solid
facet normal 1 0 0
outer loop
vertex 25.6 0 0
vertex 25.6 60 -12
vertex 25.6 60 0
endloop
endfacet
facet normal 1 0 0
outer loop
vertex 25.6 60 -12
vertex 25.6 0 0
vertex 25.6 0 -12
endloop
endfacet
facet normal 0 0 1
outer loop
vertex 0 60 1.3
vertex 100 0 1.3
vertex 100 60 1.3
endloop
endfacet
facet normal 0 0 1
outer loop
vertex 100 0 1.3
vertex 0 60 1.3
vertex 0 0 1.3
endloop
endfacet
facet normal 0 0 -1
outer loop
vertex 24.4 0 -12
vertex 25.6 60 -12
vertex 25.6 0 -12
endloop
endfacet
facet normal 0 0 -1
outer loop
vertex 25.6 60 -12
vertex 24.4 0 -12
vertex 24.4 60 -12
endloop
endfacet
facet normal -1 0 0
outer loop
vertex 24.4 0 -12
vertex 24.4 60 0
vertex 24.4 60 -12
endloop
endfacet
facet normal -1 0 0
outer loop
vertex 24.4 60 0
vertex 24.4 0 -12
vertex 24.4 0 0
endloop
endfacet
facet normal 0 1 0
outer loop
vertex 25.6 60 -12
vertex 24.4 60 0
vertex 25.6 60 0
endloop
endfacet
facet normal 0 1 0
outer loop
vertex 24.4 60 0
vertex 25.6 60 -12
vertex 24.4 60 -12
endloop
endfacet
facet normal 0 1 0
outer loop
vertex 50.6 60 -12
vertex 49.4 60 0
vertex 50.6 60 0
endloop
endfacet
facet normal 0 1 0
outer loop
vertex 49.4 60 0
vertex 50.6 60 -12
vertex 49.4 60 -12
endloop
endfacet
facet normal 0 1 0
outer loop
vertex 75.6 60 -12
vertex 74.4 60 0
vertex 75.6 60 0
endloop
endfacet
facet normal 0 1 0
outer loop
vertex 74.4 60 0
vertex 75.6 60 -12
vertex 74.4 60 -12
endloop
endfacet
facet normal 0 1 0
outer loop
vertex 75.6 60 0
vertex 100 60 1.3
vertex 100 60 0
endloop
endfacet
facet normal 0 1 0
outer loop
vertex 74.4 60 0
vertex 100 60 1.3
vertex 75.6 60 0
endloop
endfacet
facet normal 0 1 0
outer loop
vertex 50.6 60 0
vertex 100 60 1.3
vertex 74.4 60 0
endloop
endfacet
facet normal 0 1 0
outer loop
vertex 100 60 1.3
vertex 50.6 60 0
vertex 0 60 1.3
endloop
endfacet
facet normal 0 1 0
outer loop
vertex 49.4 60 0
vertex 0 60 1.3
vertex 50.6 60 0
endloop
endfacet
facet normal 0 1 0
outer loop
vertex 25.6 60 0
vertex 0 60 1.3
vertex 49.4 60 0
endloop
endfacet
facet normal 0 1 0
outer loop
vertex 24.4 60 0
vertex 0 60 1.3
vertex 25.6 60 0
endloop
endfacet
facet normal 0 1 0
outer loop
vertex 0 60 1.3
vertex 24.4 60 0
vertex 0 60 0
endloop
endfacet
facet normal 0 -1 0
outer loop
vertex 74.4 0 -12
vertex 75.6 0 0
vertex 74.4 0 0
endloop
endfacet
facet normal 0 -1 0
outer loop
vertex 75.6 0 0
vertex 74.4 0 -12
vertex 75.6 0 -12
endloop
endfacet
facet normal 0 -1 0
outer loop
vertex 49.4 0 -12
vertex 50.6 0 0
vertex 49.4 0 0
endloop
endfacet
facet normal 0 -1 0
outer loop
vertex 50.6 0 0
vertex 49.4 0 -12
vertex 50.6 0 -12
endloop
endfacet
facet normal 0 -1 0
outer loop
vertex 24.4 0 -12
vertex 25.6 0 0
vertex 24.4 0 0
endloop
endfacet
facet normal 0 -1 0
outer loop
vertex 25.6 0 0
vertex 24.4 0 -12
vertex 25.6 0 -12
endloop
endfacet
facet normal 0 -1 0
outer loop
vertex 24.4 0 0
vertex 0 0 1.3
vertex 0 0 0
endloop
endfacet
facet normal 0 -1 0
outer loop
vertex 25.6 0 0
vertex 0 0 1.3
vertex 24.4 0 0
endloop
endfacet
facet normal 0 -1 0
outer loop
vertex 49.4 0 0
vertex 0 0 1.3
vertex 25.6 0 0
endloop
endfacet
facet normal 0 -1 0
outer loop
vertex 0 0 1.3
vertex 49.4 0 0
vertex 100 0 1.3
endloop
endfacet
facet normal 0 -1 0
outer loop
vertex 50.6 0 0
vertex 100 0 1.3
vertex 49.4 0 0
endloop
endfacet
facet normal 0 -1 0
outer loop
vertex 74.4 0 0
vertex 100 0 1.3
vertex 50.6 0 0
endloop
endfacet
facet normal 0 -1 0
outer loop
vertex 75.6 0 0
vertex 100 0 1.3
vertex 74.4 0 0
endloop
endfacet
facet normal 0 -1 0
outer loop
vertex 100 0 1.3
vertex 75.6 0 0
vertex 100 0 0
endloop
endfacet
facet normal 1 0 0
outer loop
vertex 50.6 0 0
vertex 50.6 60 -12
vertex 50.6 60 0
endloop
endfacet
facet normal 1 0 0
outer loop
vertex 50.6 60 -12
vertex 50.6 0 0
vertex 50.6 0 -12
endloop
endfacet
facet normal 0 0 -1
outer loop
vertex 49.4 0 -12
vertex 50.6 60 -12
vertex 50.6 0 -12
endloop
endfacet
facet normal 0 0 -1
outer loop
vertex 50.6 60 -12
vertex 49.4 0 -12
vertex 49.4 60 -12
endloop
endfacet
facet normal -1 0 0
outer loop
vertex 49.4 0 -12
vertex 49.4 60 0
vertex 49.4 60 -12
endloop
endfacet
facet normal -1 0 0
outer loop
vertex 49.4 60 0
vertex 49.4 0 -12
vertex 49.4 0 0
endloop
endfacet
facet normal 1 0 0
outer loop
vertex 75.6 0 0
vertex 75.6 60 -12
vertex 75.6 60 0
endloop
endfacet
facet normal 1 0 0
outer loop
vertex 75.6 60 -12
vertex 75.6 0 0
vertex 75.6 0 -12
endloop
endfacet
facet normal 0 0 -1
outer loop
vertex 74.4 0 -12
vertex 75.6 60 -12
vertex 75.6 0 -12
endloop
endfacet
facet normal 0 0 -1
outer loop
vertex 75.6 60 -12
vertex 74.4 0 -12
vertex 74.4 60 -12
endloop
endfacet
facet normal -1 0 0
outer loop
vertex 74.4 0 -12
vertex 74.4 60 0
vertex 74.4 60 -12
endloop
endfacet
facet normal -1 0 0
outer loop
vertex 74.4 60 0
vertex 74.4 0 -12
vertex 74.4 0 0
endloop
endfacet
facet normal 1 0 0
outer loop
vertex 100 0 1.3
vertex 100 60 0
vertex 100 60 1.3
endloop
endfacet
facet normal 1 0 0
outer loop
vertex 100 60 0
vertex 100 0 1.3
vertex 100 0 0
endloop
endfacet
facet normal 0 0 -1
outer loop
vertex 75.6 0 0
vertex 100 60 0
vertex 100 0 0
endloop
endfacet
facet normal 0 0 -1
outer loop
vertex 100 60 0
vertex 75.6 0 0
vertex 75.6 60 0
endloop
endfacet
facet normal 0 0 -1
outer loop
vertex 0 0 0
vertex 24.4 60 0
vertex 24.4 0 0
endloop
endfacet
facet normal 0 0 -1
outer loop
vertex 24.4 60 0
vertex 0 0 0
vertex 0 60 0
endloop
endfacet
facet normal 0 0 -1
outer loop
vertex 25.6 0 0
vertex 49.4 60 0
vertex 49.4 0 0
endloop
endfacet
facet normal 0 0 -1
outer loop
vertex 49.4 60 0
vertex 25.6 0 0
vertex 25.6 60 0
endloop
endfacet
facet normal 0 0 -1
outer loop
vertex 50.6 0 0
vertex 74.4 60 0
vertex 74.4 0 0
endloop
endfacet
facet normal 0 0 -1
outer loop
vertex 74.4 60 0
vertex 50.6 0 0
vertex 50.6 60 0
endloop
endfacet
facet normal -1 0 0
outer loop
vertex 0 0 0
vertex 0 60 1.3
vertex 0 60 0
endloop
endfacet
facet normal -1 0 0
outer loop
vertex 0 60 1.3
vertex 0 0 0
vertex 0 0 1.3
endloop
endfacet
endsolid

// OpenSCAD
$fn = 32;

// ----------------------------------------------------------------------
// Ribbed panel: 1.3 mm panel
// ----------------------------------------------------------------------

// --- parameters (mm) ---
panel_l = 100;            // panel length, X
panel_w = 60;             // panel width, Y
panel_t = 1.3;            // panel thickness, Z
rib_t = 1.2;              // rib thickness
rib_h = 12;               // rib height below the panel
ribs = 3;                 // number of ribs

total_h = panel_t + rib_h;  // overall height

union() {
  cube([panel_l, panel_w, panel_t]);
  for (i = [1 : ribs])
    translate([i * panel_l / (ribs + 1) - rib_t / 2, 0, -rib_h])
      cube([rib_t, panel_w, rib_h + panel_t]);
}
